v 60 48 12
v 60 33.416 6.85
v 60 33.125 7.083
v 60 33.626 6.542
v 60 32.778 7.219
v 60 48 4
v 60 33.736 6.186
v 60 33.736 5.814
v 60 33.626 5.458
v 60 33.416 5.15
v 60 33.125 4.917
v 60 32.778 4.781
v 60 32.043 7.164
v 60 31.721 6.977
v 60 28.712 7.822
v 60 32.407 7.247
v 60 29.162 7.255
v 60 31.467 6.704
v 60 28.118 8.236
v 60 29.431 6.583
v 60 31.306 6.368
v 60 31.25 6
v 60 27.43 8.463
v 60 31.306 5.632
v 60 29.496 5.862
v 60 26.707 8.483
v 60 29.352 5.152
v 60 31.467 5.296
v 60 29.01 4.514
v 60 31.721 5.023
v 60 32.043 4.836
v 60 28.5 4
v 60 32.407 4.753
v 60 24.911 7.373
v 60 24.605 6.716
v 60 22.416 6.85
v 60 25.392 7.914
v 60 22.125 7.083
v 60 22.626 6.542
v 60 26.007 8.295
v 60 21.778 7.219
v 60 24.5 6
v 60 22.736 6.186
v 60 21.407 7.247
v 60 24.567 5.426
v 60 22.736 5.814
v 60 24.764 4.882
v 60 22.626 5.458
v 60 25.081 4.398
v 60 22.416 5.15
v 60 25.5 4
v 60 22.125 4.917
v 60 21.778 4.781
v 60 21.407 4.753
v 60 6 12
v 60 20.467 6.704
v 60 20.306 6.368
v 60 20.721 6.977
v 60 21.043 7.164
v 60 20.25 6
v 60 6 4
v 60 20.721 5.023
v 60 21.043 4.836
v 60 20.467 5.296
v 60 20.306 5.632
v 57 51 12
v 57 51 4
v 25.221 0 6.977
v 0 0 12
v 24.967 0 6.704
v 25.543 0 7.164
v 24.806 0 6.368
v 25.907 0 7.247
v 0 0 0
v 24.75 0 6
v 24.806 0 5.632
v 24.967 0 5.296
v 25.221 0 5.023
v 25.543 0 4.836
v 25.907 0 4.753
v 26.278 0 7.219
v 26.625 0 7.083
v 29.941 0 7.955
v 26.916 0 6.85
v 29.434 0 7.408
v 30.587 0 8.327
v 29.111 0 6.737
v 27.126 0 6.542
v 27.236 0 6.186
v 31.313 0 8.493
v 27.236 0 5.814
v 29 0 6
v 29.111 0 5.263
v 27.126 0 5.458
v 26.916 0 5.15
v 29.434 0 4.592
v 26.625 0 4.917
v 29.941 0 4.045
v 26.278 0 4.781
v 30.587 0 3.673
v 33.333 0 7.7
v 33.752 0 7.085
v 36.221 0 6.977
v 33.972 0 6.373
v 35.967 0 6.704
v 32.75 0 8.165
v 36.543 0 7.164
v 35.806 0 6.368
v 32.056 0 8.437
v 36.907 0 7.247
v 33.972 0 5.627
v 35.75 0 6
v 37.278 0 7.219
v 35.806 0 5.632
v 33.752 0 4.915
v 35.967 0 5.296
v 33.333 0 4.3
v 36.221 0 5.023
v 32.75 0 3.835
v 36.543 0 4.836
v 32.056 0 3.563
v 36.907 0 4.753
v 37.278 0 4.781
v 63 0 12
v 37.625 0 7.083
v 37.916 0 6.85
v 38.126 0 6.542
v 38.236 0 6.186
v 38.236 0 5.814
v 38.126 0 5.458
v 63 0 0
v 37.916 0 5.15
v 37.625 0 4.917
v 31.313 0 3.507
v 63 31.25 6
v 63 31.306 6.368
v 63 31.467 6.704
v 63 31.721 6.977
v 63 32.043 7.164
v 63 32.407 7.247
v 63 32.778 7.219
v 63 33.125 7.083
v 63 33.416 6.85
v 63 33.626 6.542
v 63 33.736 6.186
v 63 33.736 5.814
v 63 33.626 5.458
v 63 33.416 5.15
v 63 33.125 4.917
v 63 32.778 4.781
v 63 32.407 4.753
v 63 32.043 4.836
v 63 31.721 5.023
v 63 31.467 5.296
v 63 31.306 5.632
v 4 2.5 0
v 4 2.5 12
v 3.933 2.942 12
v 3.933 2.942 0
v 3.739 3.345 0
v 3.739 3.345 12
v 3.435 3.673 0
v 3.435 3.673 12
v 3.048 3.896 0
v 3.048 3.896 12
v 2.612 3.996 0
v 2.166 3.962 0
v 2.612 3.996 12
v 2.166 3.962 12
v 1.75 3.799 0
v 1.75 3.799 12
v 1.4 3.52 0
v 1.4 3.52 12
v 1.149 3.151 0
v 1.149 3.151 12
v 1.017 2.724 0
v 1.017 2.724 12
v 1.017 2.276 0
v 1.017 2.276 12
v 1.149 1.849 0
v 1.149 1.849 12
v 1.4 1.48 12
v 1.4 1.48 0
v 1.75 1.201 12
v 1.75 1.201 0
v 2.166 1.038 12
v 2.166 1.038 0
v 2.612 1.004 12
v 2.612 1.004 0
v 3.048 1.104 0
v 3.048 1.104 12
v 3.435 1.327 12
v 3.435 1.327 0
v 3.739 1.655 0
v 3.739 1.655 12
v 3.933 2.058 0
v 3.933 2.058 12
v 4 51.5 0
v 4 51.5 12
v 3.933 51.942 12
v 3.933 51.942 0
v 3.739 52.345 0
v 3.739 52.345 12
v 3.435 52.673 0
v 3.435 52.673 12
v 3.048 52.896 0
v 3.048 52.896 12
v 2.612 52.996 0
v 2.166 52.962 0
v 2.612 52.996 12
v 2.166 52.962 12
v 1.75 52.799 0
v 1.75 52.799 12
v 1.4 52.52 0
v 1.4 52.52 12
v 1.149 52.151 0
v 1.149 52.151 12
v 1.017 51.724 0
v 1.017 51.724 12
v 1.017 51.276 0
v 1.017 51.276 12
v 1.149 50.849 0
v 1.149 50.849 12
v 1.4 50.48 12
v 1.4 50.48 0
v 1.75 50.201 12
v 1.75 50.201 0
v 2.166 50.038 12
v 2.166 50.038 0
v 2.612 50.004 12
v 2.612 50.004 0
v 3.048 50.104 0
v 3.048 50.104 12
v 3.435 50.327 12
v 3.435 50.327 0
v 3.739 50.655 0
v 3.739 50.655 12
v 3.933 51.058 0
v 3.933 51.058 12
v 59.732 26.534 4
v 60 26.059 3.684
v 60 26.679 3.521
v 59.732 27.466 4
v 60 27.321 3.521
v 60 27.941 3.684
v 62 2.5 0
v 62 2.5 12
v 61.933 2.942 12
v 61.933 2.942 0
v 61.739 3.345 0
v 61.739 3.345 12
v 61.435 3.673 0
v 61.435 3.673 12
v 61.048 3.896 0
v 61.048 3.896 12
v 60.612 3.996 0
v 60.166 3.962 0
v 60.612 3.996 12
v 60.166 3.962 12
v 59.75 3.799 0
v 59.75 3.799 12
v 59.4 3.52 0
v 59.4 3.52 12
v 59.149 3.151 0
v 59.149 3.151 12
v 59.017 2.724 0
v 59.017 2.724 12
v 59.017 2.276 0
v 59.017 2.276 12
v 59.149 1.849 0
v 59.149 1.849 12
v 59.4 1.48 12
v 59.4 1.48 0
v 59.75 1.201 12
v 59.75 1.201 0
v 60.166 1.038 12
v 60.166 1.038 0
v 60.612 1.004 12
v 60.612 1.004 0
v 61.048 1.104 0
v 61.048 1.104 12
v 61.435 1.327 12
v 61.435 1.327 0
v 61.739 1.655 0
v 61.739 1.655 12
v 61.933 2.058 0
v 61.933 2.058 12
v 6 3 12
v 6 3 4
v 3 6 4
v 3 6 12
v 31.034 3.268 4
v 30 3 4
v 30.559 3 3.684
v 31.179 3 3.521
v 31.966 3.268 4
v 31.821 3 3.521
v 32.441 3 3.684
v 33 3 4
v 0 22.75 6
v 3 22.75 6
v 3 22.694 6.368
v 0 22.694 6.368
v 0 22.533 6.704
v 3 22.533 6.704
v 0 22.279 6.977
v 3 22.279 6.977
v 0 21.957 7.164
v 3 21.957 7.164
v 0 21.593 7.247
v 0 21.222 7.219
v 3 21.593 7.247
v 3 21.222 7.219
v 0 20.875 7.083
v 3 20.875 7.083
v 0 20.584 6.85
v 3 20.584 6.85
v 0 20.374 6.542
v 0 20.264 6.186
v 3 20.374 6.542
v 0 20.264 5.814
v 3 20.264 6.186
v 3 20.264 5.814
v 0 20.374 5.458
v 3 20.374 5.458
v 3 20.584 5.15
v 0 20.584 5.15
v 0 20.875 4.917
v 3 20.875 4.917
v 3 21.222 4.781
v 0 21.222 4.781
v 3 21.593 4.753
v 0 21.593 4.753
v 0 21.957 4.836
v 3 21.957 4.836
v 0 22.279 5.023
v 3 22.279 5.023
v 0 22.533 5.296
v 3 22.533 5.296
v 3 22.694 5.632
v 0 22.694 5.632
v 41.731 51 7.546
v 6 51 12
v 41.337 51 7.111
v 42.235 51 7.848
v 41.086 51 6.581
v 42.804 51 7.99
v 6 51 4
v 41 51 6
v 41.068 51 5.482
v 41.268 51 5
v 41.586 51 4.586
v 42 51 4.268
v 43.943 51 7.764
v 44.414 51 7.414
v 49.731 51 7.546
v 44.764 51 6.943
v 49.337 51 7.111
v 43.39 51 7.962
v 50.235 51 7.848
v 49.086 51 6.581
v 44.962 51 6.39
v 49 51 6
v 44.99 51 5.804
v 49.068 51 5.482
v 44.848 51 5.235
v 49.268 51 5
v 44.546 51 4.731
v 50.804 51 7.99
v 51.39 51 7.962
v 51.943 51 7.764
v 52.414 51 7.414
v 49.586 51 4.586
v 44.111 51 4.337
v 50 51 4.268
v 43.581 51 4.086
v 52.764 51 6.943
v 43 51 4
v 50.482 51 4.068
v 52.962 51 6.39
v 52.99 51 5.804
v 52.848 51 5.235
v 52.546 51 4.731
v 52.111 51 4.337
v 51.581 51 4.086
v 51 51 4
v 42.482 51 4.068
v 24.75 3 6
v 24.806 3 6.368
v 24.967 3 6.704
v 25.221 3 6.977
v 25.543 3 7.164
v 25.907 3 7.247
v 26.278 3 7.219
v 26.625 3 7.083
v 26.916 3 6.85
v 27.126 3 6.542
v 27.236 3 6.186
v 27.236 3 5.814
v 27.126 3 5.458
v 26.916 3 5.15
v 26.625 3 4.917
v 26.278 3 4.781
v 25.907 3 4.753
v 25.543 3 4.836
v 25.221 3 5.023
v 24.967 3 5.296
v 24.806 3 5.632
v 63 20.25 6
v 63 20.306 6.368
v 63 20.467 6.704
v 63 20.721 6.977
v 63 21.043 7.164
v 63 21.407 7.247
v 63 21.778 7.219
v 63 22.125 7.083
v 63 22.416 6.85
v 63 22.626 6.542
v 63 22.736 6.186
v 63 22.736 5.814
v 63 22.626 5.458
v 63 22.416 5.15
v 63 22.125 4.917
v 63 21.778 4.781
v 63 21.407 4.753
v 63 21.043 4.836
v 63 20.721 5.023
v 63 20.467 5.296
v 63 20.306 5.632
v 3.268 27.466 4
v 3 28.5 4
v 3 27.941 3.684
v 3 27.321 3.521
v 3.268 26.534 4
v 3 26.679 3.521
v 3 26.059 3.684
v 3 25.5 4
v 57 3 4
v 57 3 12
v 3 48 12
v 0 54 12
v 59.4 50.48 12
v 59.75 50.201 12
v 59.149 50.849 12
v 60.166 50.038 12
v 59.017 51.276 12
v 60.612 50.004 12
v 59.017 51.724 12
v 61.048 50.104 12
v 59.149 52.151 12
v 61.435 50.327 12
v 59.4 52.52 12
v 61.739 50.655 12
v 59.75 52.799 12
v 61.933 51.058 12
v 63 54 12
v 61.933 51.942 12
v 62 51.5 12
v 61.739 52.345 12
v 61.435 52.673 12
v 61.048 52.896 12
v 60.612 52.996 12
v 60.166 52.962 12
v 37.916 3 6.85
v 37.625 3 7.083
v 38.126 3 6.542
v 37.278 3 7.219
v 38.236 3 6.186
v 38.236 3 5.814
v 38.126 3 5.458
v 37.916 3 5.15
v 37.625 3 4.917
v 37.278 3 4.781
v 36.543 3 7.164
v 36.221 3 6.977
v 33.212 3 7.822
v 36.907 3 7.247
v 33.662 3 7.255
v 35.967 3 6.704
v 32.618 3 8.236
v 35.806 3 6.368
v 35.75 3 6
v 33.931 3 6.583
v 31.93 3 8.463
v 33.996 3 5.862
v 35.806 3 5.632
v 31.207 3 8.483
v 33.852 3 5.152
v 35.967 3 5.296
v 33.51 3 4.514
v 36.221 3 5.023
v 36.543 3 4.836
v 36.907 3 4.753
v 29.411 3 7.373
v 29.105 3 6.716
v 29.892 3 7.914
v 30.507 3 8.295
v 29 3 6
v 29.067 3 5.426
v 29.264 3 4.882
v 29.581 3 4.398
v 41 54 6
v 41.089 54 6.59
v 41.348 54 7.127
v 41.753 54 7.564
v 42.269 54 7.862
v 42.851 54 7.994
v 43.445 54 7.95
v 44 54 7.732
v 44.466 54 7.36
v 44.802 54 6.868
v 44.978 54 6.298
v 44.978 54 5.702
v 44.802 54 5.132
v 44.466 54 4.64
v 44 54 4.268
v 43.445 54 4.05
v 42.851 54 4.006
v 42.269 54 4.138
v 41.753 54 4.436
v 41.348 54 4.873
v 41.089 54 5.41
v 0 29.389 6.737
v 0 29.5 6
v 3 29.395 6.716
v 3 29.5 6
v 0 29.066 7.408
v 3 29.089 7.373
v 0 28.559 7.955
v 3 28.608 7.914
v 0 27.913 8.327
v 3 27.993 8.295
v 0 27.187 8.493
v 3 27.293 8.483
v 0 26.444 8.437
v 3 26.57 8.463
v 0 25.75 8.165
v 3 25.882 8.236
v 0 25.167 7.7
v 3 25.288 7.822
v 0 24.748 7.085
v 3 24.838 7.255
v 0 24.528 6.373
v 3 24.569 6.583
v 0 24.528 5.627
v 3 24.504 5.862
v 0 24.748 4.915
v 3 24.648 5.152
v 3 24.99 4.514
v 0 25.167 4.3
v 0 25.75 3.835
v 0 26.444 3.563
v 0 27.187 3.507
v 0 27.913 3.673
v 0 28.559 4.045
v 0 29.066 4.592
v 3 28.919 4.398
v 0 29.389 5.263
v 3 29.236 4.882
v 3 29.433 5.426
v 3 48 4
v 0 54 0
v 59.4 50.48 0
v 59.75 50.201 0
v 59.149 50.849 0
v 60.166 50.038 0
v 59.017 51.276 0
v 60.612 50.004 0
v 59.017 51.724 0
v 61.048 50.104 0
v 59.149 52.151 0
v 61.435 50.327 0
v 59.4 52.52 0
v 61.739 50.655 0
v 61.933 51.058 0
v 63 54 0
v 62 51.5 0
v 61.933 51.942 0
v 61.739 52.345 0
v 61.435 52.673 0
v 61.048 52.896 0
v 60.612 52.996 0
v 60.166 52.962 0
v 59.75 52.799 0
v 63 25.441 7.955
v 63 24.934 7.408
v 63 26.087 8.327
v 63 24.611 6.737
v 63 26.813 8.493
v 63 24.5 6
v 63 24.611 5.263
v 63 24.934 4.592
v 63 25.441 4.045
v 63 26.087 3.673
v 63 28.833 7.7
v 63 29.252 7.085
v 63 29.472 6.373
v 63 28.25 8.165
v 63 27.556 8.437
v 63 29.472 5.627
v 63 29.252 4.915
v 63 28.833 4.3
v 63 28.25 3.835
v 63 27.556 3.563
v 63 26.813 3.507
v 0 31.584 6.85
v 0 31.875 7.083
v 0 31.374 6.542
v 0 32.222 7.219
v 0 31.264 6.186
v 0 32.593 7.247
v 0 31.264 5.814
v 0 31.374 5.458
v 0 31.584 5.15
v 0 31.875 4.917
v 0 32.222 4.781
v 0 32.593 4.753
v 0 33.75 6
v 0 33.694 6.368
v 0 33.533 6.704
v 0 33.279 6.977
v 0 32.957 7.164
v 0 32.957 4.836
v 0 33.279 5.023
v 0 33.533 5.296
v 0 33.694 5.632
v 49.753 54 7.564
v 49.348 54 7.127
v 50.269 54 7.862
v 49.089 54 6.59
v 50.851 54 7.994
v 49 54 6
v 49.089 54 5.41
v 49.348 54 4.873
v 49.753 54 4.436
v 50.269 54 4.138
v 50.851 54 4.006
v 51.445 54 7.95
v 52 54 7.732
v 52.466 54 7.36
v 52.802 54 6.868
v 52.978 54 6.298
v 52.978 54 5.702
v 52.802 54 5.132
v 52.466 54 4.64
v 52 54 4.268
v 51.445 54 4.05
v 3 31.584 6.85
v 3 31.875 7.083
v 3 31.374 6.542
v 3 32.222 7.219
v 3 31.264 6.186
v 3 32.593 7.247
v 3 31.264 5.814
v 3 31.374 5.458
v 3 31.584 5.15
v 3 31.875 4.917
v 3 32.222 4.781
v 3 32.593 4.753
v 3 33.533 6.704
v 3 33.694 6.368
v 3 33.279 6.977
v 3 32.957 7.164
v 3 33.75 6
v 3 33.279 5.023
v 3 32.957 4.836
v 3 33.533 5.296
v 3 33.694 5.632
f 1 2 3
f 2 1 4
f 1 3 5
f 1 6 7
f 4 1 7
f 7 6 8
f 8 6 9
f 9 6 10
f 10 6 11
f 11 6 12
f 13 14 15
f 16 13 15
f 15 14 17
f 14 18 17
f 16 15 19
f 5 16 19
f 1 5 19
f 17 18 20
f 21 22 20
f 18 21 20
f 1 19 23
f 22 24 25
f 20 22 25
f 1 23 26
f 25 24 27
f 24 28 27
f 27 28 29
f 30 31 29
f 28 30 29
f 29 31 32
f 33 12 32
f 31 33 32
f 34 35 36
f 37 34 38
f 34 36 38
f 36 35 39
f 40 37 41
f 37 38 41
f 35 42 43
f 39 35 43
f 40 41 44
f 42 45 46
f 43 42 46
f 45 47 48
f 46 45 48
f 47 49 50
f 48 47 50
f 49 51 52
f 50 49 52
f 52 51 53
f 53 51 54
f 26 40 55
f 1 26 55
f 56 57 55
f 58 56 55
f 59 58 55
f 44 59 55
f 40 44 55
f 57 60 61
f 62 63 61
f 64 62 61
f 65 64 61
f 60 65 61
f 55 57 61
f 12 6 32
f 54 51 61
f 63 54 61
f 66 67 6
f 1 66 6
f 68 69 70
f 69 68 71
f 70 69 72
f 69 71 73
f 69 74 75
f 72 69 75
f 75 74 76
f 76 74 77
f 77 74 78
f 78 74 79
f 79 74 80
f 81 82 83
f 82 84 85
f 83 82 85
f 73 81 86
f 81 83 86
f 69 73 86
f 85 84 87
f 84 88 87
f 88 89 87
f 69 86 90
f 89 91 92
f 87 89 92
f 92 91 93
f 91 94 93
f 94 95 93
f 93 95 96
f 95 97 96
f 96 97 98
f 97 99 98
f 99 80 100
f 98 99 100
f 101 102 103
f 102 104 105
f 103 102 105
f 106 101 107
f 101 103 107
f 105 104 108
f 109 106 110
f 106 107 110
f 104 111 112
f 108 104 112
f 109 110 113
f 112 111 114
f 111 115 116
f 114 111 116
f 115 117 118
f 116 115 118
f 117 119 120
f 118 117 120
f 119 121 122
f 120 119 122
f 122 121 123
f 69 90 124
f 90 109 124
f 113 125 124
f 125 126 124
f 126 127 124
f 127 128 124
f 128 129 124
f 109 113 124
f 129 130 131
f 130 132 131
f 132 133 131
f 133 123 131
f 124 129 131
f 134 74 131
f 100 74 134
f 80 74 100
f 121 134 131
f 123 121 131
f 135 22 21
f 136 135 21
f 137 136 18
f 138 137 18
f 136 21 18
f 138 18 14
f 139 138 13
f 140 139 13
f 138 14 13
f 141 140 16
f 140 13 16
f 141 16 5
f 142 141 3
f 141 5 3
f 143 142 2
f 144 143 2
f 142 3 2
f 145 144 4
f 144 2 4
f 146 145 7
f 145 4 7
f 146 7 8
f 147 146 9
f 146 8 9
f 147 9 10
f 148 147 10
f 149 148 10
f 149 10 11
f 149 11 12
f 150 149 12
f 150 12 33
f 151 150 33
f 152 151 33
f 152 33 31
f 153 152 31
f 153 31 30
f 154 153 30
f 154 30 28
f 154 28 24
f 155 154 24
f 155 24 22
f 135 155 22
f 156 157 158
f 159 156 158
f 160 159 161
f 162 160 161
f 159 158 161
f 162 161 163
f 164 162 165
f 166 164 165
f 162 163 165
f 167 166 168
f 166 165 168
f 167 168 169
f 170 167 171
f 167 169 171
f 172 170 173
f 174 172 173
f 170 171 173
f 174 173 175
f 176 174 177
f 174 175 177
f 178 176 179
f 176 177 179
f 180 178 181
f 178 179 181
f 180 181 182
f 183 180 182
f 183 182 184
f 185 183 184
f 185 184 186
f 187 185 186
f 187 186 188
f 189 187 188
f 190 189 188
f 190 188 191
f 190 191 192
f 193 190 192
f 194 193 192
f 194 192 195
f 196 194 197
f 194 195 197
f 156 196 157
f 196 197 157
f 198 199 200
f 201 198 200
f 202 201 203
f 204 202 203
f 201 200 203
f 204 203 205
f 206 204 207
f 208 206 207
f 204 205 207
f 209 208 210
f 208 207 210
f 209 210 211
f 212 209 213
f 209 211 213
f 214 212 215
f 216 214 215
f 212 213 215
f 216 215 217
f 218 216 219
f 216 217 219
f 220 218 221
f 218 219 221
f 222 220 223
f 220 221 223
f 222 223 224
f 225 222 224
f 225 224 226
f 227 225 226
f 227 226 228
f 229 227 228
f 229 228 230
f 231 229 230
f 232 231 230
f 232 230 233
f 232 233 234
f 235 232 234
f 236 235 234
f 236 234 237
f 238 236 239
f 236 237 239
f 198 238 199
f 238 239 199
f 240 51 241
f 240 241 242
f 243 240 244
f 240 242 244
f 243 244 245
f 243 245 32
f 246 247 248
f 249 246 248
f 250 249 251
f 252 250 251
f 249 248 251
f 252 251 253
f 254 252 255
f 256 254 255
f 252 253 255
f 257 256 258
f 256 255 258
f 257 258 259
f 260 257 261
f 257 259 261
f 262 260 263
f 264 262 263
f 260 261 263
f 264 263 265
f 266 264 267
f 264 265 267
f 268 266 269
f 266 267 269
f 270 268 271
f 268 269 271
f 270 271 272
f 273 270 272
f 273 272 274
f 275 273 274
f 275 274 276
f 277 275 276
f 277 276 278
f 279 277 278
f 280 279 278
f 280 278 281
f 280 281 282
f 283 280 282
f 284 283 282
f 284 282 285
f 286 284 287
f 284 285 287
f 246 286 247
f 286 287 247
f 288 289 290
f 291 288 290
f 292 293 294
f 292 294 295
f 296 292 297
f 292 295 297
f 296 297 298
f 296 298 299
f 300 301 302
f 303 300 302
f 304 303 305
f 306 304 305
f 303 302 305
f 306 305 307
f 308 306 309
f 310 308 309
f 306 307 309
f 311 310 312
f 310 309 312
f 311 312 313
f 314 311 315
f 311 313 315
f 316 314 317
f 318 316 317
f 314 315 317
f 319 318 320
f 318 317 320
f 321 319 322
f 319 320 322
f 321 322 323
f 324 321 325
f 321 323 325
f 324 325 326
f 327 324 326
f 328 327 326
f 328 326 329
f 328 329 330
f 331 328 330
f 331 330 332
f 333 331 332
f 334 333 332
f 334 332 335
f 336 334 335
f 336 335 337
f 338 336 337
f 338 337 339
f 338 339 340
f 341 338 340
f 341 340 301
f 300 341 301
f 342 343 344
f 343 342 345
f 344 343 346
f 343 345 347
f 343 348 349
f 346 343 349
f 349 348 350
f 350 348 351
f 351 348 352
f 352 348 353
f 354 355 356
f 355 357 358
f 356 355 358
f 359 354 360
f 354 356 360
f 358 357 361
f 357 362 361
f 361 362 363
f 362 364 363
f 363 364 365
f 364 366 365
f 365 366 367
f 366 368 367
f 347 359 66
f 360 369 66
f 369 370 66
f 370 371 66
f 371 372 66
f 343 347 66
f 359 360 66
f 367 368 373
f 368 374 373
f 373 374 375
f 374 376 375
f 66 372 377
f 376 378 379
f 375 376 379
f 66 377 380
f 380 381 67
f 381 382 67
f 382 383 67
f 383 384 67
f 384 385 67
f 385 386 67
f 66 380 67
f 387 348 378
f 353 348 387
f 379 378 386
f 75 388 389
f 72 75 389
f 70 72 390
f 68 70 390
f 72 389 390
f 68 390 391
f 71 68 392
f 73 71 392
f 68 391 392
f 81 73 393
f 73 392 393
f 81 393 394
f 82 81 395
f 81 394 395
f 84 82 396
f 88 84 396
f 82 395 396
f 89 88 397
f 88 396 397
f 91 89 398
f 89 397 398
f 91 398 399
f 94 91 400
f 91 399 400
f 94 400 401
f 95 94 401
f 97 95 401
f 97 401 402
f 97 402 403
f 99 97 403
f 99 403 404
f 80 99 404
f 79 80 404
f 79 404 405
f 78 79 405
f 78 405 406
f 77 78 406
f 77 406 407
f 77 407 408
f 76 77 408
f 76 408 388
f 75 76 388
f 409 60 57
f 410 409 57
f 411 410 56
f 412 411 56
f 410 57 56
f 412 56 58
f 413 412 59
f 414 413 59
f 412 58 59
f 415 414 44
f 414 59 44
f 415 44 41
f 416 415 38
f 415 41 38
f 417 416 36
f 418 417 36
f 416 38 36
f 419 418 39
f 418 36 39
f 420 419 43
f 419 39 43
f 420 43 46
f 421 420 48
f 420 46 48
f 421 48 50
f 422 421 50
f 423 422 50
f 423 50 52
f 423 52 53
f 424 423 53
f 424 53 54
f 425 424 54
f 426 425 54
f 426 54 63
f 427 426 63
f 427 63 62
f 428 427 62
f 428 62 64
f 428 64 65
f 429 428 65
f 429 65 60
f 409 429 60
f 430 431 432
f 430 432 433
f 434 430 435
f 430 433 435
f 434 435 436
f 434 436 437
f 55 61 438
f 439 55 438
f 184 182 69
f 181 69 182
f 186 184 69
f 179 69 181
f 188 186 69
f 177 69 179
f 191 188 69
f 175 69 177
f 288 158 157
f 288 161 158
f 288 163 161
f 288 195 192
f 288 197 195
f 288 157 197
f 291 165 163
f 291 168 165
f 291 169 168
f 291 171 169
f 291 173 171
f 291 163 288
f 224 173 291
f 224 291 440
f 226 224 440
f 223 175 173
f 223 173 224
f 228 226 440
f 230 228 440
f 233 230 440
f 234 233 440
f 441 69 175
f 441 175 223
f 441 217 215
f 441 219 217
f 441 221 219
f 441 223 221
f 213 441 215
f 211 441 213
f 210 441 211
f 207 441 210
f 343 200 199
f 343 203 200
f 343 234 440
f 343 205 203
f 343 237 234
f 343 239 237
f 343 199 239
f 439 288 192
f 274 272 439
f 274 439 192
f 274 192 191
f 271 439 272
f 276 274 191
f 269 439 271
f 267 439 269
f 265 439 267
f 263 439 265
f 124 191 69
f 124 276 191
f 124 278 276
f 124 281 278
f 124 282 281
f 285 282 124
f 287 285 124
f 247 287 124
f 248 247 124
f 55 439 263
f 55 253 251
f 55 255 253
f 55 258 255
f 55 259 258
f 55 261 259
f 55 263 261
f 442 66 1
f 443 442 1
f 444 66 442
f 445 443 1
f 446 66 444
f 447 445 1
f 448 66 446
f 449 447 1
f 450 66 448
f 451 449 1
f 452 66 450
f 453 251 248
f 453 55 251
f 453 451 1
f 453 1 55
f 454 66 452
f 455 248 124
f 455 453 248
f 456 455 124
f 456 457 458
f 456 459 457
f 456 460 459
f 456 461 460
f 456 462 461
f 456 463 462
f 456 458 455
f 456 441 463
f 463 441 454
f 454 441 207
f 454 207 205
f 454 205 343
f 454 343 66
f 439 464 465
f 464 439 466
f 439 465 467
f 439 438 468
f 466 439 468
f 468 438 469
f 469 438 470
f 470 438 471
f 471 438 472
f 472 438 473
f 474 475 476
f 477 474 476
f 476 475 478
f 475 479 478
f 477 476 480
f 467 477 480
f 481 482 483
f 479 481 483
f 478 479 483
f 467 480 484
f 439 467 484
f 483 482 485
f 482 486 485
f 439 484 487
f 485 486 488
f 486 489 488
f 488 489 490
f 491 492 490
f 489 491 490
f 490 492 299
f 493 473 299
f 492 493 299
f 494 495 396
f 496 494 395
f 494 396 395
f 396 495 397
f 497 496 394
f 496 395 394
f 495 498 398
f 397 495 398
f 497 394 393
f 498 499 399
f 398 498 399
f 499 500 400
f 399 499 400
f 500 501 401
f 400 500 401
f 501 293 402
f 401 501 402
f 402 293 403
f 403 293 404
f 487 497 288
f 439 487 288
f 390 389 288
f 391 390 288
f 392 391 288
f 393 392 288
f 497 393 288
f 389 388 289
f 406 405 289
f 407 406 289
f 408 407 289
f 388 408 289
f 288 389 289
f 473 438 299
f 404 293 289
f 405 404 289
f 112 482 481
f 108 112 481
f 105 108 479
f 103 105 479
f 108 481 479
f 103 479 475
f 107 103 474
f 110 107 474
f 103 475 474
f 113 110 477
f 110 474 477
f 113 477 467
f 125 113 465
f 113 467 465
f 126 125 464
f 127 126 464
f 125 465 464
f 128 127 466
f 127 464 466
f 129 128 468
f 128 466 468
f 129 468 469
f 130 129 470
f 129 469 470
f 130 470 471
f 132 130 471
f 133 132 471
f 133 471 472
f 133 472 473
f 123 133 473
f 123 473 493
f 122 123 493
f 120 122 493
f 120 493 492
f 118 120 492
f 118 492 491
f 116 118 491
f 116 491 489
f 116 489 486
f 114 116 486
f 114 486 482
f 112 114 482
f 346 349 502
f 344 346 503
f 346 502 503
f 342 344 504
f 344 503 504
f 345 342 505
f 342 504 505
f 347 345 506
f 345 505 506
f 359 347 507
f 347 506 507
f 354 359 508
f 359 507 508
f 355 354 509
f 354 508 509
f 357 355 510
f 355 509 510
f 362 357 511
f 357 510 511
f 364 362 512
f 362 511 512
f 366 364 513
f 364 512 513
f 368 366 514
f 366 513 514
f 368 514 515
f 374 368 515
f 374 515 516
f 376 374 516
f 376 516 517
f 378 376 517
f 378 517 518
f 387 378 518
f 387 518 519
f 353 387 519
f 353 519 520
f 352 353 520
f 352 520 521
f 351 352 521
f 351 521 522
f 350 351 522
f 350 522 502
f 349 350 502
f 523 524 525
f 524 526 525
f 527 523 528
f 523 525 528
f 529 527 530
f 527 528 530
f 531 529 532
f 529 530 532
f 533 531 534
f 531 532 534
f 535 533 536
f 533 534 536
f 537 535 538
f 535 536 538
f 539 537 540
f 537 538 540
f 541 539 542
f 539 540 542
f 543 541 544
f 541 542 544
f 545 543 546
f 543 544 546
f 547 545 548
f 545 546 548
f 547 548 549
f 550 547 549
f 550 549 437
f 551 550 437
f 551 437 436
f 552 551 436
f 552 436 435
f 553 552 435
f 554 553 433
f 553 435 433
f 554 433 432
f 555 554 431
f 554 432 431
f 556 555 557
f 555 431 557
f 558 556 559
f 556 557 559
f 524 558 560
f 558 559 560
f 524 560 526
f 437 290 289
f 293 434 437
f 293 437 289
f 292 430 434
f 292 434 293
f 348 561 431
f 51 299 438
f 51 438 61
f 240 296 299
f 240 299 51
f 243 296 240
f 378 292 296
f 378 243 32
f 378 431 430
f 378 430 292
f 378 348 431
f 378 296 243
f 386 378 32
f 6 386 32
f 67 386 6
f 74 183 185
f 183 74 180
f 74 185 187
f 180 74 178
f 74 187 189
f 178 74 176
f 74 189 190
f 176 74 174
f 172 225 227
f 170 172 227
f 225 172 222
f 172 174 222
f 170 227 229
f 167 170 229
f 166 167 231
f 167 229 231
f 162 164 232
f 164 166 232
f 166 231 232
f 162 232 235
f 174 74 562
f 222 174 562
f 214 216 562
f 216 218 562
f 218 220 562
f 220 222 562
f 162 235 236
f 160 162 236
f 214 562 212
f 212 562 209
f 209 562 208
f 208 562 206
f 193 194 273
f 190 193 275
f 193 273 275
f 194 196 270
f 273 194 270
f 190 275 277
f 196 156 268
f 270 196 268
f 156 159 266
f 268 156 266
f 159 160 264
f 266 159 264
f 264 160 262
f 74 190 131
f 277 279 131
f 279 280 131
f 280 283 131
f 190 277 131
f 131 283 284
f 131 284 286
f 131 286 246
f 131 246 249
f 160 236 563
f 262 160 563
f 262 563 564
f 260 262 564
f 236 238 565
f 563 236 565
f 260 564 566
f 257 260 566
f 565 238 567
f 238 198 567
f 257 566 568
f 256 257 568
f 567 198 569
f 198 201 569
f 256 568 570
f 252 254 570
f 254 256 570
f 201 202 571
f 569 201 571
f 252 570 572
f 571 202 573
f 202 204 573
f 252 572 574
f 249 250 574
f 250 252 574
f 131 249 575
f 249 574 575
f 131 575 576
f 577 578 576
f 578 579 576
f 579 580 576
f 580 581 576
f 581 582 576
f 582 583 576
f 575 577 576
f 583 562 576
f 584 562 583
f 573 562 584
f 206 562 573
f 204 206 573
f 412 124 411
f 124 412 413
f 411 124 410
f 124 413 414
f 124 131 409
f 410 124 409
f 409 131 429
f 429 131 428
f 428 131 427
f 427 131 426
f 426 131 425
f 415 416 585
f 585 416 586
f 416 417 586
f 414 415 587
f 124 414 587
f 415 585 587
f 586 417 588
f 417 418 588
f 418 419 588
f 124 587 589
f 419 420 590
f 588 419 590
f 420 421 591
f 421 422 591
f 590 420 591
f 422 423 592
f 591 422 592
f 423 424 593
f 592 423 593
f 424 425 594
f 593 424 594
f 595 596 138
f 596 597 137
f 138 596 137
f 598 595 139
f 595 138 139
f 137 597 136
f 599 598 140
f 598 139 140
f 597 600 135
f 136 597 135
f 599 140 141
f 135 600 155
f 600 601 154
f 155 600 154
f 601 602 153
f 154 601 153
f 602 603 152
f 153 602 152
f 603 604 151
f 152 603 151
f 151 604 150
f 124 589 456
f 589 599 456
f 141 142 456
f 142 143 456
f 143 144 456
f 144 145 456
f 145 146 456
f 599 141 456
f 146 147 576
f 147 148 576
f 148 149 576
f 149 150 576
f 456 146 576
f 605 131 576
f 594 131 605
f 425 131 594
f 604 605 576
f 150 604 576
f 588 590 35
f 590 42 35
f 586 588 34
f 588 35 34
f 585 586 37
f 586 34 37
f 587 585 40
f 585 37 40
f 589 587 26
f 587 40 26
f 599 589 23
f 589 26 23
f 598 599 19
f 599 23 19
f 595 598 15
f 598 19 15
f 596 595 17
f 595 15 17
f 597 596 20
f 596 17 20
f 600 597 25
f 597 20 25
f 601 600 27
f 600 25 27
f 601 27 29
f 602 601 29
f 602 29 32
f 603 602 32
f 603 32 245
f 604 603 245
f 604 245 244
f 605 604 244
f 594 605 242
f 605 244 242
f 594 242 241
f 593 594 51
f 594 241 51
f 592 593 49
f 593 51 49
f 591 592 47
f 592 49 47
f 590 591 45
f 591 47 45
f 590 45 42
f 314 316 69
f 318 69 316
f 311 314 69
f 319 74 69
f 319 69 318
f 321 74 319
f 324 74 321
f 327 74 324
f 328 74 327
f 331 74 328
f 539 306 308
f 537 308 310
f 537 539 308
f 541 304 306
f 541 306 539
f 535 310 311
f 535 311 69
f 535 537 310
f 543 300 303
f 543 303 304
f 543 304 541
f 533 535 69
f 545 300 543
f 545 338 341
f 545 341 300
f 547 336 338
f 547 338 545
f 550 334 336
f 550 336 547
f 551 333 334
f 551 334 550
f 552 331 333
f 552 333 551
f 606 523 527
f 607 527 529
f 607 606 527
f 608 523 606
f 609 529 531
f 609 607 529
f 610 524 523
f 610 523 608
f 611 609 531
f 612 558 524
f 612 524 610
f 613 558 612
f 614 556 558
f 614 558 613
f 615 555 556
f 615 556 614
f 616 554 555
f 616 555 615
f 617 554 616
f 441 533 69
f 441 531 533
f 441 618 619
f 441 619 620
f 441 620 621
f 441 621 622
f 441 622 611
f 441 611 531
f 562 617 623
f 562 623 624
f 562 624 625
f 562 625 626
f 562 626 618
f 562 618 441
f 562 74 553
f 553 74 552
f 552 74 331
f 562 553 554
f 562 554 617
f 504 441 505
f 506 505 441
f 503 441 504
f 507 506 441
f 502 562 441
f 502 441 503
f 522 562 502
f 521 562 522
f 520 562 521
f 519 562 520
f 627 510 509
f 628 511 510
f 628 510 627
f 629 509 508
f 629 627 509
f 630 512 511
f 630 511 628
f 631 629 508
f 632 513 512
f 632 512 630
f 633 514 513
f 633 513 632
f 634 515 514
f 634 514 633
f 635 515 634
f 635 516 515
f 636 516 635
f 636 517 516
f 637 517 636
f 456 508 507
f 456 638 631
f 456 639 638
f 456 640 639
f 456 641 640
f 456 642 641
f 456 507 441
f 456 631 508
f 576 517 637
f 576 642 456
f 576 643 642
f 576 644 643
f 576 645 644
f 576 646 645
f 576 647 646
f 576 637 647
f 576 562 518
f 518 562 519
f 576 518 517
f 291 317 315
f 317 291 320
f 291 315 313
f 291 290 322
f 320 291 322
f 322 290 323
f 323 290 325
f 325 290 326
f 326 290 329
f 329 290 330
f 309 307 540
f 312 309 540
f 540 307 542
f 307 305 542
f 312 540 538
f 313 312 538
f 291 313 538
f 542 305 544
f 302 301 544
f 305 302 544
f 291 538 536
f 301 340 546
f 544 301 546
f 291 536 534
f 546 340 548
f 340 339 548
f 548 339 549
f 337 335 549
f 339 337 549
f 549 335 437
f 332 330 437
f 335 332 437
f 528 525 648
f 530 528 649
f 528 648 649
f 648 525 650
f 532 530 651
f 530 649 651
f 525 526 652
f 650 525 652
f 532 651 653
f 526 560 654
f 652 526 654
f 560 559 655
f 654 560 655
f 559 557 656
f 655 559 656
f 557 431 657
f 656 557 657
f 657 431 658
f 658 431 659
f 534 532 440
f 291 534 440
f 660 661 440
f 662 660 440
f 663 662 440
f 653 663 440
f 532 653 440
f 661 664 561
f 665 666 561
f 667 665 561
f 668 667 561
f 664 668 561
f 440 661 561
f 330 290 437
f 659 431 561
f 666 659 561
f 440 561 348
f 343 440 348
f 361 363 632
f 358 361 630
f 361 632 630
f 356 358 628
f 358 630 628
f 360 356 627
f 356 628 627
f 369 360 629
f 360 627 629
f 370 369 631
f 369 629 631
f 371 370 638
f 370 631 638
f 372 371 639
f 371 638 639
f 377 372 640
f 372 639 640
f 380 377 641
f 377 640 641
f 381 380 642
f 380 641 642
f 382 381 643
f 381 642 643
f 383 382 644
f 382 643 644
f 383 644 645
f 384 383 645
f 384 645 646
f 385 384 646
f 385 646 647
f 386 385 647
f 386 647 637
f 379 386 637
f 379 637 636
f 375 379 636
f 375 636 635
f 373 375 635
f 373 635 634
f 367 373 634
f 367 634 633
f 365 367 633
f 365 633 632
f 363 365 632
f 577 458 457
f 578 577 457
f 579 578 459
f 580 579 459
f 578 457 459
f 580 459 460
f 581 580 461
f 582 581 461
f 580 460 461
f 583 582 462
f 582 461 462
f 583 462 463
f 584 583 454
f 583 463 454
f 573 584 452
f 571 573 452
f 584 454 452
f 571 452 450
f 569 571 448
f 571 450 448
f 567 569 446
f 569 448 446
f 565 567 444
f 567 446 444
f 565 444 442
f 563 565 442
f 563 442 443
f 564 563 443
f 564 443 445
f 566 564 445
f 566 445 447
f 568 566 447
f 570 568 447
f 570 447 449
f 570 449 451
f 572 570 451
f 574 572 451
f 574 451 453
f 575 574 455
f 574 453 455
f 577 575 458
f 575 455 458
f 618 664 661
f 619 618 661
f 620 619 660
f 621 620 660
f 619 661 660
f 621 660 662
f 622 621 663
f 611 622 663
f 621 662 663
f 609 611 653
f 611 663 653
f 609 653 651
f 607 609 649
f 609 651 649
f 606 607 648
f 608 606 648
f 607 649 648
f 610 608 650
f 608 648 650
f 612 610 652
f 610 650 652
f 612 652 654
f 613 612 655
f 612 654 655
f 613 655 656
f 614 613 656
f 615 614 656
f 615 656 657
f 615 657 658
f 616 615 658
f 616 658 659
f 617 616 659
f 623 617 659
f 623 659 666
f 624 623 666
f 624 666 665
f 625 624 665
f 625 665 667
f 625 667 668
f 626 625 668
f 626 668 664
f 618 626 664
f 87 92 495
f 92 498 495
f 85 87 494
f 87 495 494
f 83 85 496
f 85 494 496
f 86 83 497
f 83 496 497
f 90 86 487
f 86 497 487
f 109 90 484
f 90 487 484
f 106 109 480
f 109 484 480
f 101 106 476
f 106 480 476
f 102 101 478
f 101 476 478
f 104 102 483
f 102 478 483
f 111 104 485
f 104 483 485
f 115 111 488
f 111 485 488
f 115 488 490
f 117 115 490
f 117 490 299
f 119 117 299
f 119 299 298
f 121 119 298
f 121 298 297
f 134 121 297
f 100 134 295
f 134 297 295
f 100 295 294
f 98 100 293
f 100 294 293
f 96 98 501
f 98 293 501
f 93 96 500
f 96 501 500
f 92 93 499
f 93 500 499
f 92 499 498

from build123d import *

# Parameters (mm, degrees)
F0_W      = 63
F0_H      = 54
F1_DEPTH  = 4
F2_W      = 63
F2_H      = 54
F3_DEPTH  = 8
F6_R      = 2
F7_DEPTH  = 3
F8_D      = 2.5
F8_DEPTH  = 4.5
F8_TIP    = 0.7510757738
F10_D     = 2.5
F10_DEPTH = 4.5
F10_TIP   = 0.7510757738
F12_D     = 5
F12_DEPTH = 3
F12_TIP   = 1.5021515476
F14_D     = 5
F14_DEPTH = 3
F14_TIP   = 1.5021515476
F15_D     = 2.5
F15_DEPTH = 4.5
F15_TIP   = 0.7510757738
F17_D     = 5
F17_DEPTH = 3
F17_TIP   = 1.5021515476
F18_R     = 1.5
F19_DEPTH = 12


with BuildPart() as f1:
    # F0 (on Top) → F1 (new body)
    with BuildSketch(Plane.XY):
        with Locations((31.5, 27)):
            Rectangle(F0_W, F0_H)
    extrude(amount=F1_DEPTH)

    # F2 (on face) → F3 (join)
    with BuildSketch(Plane.XY.offset(4)):
        with Locations((31.5, 27)):
            Rectangle(F2_W, F2_H)
        Polygon((3, 48), (6, 51), (57, 51), (60, 48), (60, 6), (57, 3), (6, 3), (3, 6), align=None, mode=Mode.SUBTRACT)
    extrude(amount=F3_DEPTH)

    # F6 (on face) → F7 (cut)
    with BuildSketch(Plane(origin=(0, 54, 0), x_dir=(-1, 0, 0), z_dir=(0, 1, 0))):
        with Locations((-43, 6)):
            Circle(F6_R)
        with Locations((-51, 6)):
            Circle(F6_R)
    extrude(amount=-F7_DEPTH, mode=Mode.SUBTRACT)

    # F8
    with Locations(Plane.XZ):
        with Locations((26, 6), (37, 6)):
            Hole(F8_D / 2, depth=F8_DEPTH)
            with Locations((0, 0, -(F8_DEPTH + F8_TIP / 2))):  # 118° drill point
                Cone(0, F8_D / 2, F8_TIP, mode=Mode.SUBTRACT)

    # F10
    with Locations(Plane(origin=(0, 0, 0), x_dir=(0, -1, 0), z_dir=(-1, 0, 0))):
        with Locations((-32.5, 6), (-21.5, 6)):
            Hole(F10_D / 2, depth=F10_DEPTH)
            with Locations((0, 0, -(F10_DEPTH + F10_TIP / 2))):  # 118° drill point
                Cone(0, F10_D / 2, F10_TIP, mode=Mode.SUBTRACT)

    # F12
    with Locations(Plane(origin=(0, 0, 0), x_dir=(0, -1, 0), z_dir=(-1, 0, 0))):
        with Locations((-27, 6)):
            Hole(F12_D / 2, depth=F12_DEPTH)
            with Locations((0, 0, -(F12_DEPTH + F12_TIP / 2))):  # 118° drill point
                Cone(0, F12_D / 2, F12_TIP, mode=Mode.SUBTRACT)

    # F14
    with Locations(Plane.XZ):
        with Locations((31.5, 6)):
            Hole(F14_D / 2, depth=F14_DEPTH)
            with Locations((0, 0, -(F14_DEPTH + F14_TIP / 2))):  # 118° drill point
                Cone(0, F14_D / 2, F14_TIP, mode=Mode.SUBTRACT)

    # F15
    with Locations(Plane.YZ.offset(63)):
        with Locations((21.5, 6), (32.5, 6)):
            Hole(F15_D / 2, depth=F15_DEPTH)
            with Locations((0, 0, -(F15_DEPTH + F15_TIP / 2))):  # 118° drill point
                Cone(0, F15_D / 2, F15_TIP, mode=Mode.SUBTRACT)

    # F17
    with Locations(Plane.YZ.offset(63)):
        with Locations((27, 6)):
            Hole(F17_D / 2, depth=F17_DEPTH)
            with Locations((0, 0, -(F17_DEPTH + F17_TIP / 2))):  # 118° drill point
                Cone(0, F17_D / 2, F17_TIP, mode=Mode.SUBTRACT)

    # F18 (on face) → F19 (cut)
    with BuildSketch(Plane.XY.offset(12)):
        with Locations((2.5, 51.5)):
            Circle(F18_R)
        with Locations((60.5, 51.5)):
            Circle(F18_R)
        with Locations((2.5, 2.5)):
            Circle(F18_R)
        with Locations((60.5, 2.5)):
            Circle(F18_R)
    extrude(amount=-F19_DEPTH, mode=Mode.SUBTRACT)


solid = f1.part
